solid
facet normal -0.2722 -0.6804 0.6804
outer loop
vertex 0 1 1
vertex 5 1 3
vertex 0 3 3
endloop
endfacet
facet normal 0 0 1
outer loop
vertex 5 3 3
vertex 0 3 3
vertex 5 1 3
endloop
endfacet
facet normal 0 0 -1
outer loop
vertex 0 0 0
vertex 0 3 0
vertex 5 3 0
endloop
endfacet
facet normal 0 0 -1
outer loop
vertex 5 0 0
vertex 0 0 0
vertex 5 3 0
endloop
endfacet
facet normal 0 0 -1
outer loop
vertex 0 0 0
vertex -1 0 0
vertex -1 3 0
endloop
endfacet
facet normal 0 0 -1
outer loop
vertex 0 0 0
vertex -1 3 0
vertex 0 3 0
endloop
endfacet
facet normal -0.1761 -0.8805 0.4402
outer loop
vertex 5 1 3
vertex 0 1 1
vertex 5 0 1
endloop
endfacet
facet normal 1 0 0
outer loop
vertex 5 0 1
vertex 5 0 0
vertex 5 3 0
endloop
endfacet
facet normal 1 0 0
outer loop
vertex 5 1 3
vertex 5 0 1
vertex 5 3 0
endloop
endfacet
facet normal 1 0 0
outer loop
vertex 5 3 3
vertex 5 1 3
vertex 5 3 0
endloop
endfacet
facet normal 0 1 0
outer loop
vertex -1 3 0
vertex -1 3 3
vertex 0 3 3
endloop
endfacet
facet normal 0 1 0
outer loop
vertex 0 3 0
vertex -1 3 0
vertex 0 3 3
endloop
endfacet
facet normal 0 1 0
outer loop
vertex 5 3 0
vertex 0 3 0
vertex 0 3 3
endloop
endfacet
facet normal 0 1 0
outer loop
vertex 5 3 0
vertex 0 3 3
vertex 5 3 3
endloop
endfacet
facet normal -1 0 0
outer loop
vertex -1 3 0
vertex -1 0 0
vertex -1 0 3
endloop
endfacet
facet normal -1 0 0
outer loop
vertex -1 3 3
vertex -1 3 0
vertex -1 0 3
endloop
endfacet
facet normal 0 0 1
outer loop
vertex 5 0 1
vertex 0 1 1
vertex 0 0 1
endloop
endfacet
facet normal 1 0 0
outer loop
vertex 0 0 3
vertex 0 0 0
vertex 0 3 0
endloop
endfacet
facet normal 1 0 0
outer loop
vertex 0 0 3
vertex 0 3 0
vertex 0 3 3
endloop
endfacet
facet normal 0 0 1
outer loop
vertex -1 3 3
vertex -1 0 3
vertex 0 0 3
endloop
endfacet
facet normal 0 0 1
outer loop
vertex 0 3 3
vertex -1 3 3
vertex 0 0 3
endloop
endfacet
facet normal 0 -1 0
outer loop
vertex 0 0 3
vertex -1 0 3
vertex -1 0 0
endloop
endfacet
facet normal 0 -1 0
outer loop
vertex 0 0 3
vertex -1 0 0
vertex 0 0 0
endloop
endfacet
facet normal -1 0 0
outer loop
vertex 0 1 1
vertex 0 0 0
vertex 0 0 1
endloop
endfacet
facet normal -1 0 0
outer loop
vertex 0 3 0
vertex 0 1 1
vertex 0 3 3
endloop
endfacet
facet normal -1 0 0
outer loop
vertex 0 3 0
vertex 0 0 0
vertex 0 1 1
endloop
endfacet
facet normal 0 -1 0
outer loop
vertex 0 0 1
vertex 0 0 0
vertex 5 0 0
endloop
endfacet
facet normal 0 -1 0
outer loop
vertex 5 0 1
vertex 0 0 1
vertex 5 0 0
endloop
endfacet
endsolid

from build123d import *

# Parameters (mm, degrees)
F0_W      = 5
F0_H      = 3
F1_DEPTH  = 3
F3_DEPTH  = 2
F6_W      = 1.736291251
F6_H      = 2.2360679775
F7_DEPTH  = 25
F10_DEPTH = 25
F11_W     = 1
F11_H     = 3
F12_DEPTH = 3


with BuildPart() as f1:
    # F0 (on Top) → F1 (new body)
    with BuildSketch(Plane.XY):
        with Locations((2.5, 1.5)):
            Rectangle(F0_W, F0_H)
    extrude(amount=F1_DEPTH)

    # F2 (on face) → F3 (cut)
    with BuildSketch(Plane.XY.offset(3)):
        Polygon((0, 1), (0, 0), (5, 0), align=None)
    extrude(amount=-F3_DEPTH, mode=Mode.SUBTRACT)

    # F6 (on 3pt) → F7 (cut)
    with BuildSketch(Plane(origin=(0.0775193798, 0.3875968992, -0.1937984496), x_dir=(0.9843740387, -0.1574998462, 0.0787499231), z_dir=(-0.1760901813, -0.8804509063, 0.4402254532))):
        Polygon((5.0006201166, 3.1304951685), (-0.0787499231, 1.3416407865), (5.0006201166, 0.894427191), align=None)
        with Locations((5.8687657421, 2.0124611797)):
            Rectangle(F6_W, F6_H)
    extrude(amount=F7_DEPTH, mode=Mode.SUBTRACT)

    # F9 (on 3pt) → F10 (cut)
    with BuildSketch(Plane(origin=(0, 0, 0), x_dir=(-0.9622504486, 0.1924500897, -0.1924500897), z_dir=(0.272165527, 0.6804138174, -0.6804138174))):
        Polygon((0, 1.4142135624), (0, 4.2426406871), (-5.1961524227, 2.8284271247), align=None)
        Polygon((-5.1961524227, 1.5010309871), (0, 1.4142135624), (-5.1961524227, 2.8284271247), align=None)
    extrude(amount=-F10_DEPTH, mode=Mode.SUBTRACT)


with BuildPart() as f12:
    # F11 (on Front) → F12 (new body)
    with BuildSketch(Plane.XZ):
        with Locations((-0.5, 1.5)):
            Rectangle(F11_W, F11_H)
    extrude(amount=-F12_DEPTH)


solid = Compound([f1.part, f12.part])
